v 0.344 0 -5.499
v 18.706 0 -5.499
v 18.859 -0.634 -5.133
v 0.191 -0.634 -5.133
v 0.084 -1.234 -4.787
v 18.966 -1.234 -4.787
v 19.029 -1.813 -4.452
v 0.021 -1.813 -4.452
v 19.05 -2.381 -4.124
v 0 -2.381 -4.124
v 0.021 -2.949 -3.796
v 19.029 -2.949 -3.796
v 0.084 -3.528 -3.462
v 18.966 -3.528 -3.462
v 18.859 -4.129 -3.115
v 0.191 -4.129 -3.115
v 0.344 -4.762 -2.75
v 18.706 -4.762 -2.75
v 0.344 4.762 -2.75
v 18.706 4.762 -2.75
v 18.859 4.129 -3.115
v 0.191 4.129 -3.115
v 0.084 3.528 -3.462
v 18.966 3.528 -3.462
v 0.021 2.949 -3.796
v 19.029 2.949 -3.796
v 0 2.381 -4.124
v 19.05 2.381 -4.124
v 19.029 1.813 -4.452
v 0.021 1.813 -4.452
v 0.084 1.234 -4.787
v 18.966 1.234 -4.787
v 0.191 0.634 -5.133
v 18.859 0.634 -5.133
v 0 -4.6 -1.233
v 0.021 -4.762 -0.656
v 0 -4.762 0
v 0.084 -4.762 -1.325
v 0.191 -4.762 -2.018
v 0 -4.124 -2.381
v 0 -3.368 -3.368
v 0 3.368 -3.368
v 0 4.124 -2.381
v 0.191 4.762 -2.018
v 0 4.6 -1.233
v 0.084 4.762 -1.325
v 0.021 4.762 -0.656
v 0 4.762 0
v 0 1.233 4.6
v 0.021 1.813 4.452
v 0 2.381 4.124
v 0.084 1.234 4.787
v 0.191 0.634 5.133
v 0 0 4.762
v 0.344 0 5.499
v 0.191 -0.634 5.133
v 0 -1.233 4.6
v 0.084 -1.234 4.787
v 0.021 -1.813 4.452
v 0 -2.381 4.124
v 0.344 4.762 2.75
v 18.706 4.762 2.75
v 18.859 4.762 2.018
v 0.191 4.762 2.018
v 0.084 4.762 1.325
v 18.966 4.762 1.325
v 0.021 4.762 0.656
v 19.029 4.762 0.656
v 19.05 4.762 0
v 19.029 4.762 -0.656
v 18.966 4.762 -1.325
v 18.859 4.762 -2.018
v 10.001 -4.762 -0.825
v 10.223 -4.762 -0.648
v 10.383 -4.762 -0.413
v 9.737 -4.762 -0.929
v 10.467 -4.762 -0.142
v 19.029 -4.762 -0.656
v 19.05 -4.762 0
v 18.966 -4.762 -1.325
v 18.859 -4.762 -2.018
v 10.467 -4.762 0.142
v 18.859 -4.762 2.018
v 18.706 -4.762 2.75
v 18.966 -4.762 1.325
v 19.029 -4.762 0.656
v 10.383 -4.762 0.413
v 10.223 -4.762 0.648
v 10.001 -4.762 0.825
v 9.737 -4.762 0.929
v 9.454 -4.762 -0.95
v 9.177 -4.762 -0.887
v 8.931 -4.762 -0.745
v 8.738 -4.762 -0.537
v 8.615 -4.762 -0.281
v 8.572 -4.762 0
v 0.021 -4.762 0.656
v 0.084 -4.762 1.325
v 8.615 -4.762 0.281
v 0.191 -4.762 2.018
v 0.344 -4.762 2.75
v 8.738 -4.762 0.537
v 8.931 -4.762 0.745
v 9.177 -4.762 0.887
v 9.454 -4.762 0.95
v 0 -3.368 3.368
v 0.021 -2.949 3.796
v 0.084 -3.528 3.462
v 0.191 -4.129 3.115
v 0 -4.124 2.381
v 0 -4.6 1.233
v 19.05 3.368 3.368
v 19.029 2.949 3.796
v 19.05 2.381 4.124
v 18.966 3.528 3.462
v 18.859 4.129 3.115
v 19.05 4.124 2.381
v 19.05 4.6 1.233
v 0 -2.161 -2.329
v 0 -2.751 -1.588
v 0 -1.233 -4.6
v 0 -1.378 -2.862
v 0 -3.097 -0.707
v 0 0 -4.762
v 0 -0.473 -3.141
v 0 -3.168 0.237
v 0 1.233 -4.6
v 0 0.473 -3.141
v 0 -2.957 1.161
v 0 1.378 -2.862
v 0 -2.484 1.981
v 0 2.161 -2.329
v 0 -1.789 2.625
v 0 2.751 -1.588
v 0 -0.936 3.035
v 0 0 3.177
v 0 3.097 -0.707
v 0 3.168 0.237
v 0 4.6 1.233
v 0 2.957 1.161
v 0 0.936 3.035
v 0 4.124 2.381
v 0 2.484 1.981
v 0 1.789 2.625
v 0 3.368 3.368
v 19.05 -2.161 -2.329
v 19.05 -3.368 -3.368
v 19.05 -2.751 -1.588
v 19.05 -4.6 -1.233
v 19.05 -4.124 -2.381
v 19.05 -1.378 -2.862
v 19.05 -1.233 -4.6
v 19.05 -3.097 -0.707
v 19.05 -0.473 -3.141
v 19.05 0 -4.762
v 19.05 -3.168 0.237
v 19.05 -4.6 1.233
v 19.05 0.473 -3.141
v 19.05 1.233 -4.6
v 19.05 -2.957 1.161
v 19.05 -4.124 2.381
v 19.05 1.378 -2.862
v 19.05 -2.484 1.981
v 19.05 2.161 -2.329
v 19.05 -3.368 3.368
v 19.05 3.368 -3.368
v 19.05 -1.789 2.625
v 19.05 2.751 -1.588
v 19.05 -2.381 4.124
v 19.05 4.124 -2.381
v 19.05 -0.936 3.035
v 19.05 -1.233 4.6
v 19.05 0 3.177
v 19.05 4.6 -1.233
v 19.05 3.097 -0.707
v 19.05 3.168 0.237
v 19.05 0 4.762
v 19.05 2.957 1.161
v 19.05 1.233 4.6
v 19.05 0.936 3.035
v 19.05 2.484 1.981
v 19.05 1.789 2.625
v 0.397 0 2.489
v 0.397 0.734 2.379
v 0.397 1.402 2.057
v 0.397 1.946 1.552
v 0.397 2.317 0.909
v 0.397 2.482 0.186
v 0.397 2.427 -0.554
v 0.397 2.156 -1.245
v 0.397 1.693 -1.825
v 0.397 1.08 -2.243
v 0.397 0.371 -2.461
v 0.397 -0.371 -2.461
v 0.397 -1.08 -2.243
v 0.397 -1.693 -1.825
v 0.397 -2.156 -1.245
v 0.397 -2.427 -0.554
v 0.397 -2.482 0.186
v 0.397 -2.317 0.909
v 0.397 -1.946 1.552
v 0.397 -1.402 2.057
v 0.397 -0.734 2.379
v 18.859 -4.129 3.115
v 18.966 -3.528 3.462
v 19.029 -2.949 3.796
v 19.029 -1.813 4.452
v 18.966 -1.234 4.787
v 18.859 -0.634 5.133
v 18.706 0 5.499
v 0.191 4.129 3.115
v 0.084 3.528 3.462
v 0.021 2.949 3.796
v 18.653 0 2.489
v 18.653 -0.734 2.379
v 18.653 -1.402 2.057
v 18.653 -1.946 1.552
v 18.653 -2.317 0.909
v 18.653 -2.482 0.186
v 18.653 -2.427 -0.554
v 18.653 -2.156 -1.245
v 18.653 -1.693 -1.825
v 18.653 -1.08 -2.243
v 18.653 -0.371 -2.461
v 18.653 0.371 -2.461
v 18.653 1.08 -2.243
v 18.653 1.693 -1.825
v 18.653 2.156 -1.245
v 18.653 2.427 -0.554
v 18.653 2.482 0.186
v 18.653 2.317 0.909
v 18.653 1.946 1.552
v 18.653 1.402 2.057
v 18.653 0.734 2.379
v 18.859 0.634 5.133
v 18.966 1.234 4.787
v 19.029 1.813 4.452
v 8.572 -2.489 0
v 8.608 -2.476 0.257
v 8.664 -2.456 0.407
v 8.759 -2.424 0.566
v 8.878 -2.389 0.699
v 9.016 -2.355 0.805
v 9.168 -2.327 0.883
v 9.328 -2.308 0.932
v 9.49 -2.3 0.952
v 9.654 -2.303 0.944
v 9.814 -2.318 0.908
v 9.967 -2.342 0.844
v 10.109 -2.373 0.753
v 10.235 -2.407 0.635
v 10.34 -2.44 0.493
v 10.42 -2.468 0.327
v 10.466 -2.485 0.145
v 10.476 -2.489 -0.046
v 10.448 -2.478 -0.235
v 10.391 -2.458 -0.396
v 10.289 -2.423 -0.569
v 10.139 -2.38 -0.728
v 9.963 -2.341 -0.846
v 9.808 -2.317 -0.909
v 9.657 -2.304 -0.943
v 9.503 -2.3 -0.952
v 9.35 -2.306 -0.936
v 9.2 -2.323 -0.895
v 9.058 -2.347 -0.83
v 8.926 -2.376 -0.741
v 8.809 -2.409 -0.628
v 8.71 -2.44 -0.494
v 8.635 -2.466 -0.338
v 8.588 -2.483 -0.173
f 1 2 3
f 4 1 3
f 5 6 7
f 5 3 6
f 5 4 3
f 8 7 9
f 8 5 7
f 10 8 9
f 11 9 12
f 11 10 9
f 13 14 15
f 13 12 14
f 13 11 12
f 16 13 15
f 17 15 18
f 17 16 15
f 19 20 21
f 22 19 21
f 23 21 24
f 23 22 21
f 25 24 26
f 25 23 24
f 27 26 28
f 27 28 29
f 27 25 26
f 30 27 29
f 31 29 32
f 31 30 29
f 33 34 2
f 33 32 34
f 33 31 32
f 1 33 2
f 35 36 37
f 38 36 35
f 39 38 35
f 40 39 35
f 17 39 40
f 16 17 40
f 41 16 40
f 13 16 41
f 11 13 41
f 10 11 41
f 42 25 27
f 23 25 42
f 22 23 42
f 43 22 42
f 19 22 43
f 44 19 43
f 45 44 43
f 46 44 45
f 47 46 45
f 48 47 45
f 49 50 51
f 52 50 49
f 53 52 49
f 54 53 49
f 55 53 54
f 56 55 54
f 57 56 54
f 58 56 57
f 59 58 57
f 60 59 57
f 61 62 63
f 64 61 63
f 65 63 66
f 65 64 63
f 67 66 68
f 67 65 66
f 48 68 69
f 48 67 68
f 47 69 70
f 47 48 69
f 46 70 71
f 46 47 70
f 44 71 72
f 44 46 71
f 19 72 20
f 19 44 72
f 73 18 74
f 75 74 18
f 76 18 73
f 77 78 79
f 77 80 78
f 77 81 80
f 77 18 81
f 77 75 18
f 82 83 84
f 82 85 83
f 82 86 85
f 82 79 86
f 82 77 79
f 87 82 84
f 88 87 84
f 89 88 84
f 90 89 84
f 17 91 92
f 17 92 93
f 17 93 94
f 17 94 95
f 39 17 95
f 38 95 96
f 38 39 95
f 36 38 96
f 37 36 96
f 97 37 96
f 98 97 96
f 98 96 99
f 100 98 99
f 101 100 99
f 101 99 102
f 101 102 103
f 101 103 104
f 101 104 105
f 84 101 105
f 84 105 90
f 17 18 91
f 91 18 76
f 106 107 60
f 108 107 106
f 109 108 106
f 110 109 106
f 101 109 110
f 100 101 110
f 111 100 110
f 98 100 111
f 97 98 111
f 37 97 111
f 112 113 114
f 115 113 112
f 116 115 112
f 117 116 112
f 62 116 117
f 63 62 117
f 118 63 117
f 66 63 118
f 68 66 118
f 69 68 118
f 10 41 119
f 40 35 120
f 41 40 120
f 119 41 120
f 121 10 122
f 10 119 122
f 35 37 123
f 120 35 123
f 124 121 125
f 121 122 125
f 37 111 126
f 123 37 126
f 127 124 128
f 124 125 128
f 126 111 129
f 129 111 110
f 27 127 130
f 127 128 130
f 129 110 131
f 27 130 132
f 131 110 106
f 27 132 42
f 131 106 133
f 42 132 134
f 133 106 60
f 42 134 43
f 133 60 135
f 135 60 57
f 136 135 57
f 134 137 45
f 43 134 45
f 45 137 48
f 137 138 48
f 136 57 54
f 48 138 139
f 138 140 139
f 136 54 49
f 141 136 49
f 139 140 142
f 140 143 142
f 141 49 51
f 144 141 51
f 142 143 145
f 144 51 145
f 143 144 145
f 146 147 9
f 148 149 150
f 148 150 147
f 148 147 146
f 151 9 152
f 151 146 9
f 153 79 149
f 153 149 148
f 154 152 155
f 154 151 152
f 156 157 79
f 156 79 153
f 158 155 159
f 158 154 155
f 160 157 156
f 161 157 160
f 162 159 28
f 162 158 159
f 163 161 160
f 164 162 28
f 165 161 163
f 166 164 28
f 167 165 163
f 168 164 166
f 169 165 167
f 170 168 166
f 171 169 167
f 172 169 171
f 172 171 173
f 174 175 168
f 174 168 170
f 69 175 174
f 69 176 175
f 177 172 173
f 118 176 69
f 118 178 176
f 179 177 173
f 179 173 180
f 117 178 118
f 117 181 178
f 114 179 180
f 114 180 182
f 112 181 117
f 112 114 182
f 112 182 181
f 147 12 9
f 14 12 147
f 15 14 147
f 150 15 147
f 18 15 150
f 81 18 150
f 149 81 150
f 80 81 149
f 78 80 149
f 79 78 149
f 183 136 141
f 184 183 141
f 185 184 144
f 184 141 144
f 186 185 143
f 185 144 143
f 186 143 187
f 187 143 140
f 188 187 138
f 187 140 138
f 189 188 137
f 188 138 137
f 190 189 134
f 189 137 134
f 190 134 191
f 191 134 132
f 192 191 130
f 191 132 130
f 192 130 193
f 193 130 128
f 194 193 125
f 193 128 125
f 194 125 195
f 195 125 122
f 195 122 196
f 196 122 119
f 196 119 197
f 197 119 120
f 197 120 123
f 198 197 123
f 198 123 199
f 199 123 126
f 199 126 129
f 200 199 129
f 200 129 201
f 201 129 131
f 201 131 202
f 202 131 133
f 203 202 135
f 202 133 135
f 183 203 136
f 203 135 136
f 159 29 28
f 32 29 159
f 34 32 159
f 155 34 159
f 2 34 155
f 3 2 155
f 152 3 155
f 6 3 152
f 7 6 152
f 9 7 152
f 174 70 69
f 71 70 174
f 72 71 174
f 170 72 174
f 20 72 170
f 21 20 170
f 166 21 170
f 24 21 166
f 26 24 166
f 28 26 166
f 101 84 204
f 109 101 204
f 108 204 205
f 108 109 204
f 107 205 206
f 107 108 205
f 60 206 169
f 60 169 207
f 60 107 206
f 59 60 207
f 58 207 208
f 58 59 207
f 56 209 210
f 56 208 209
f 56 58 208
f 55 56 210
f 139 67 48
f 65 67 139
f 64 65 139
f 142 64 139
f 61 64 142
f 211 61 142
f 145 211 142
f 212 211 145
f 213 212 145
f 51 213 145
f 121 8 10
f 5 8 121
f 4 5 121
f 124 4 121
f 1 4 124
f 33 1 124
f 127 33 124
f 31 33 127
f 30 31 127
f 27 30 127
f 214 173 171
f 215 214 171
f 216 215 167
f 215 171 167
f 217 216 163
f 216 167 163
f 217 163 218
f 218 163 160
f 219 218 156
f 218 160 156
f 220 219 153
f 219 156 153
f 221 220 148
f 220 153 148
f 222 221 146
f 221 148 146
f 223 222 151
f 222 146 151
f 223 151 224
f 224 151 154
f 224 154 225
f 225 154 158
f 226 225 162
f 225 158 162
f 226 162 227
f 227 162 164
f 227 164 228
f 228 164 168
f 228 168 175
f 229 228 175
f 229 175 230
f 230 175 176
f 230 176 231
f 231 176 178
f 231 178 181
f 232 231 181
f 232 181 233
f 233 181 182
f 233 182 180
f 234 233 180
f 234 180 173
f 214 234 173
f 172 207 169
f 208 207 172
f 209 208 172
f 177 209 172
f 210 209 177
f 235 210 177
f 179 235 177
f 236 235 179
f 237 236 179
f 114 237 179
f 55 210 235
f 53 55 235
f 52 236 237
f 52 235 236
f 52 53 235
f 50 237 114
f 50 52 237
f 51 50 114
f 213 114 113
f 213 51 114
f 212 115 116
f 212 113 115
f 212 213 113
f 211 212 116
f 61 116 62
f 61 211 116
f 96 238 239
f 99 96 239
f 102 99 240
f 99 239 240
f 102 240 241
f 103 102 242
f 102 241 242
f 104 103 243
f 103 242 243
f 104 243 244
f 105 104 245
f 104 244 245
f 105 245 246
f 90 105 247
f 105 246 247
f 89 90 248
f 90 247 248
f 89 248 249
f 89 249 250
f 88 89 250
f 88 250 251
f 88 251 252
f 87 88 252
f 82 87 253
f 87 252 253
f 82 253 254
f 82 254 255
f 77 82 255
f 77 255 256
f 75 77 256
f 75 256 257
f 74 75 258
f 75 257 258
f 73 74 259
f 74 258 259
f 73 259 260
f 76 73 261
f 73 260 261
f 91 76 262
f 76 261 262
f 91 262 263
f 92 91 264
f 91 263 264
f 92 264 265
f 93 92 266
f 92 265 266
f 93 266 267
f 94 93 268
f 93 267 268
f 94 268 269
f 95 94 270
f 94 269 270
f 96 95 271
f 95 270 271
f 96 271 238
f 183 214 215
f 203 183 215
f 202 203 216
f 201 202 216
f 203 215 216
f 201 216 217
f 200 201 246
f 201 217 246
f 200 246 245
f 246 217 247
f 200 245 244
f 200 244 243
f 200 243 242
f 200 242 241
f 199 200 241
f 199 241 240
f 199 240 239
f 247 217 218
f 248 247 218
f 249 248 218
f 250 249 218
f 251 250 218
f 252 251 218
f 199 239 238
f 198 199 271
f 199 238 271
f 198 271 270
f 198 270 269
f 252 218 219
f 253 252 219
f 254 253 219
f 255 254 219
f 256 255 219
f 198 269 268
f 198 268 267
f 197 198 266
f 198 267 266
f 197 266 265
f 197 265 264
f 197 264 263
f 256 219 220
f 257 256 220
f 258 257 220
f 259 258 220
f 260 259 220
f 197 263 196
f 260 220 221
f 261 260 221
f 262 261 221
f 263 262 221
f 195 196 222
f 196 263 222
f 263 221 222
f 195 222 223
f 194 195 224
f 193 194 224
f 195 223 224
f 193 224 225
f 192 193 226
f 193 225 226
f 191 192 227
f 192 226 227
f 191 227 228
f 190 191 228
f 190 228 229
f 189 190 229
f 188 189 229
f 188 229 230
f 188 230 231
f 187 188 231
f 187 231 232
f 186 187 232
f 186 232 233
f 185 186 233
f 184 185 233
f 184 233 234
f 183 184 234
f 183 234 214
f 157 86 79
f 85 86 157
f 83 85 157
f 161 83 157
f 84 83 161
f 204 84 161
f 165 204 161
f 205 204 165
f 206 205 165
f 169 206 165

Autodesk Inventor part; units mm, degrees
ref_plane "YZ Plane" through (0, 0, 0) normal (1, 0, 0) x (0, 1, 0)
ref_plane "XZ Plane" through (0, 0, 0) normal (0, 1, 0) x (-1, 0, 0)
sketch "Sketch1" plane through (0, 0, 0) normal (1, 0, 0) x (0, 1, 0)
  line L0 (-6.6675, 0) -> (6.6675, 0) projected
  line L1 (0, -7.699) -> (0, 7.699) projected
  line L2 (0, 5.4993) -> (4.7625, 2.7496)
  line L3 (4.7625, 2.7496) -> (4.7625, -2.7496)
  line L4 (4.7625, -2.7496) -> (0, -5.4993)
  line L5 (0, -5.4993) -> (-4.7625, -2.7496)
  line L6 (-4.7625, -2.7496) -> (-4.7625, 2.7496)
  line L7 (-4.7625, 2.7496) -> (0, 5.4993)
  point P0 (0, 0)
  dimension "d40" = 9.525
extrude "Body" add sketch "Sketch1" along normal blind 19.05
sketch "Sketch2" plane through (0, 0, 0) normal (-1, 0, 0) x (0, 0, 1)
  line L0 (0, -6.6675) -> (0, 6.6675) projected
  line L1 (-7.699, 0) -> (7.699, 0) projected
  point P0 (0, 0)
hole "Thread" at (0, 0, 0) direction (1, 0, 0) diameter 4.9784 end through all thread size "1/4-20 UNC" class "2B" standard "ANSI Unified Screw Threads"
sketch "Sketch3" plane through (0, 0, 0) normal (0, 0, 1) x (1, 0, 0)
  line L0 (-3.81, 0) -> (22.86, 0) projected
  line L1 (0, 0) -> (0, 4.7625) projected
  line L2 (19.05, 0) -> (19.05, 4.7625) projected
  line L3 (0, 4.7625) -> (19.05, 4.7625) construction
  line L4 (0, 5.4993) -> (0, 4.7625)
  line L5 (0, 4.7625) -> (0.3436, 5.4993)
  line L6 (0.3436, 5.4993) -> (0, 5.4993)
  line L7 (19.05, 4.7625) -> (19.05, 5.4993)
  line L8 (19.05, 5.4993) -> (18.7064, 5.4993)
  line L9 (18.7064, 5.4993) -> (19.05, 4.7625)
  line L10 (0.3436, 5.4993) -> (18.7064, 5.4993)
  line L11 (0, 4.7625) -> (19.05, 4.7625)
  line L12 (0, 0) -> (19.05, 0) projected
  dimension "d45" = 9.525
  dimension "d46" = 10.9985
  dimension "d47" = 25
  dimension "d48" = 25
revolve "Chamfer1" cut sketch "Sketch3" angle 360 about axis through (-10, 0, 0) along (1, 0, 0) contours L4 L6 L5 | L9 L8 L7
chamfer "Chamfer2" distance 0.6874 angle 30 1 edges at (0, 0, -2.4892) measured on face at (0, 2.8968, -2.7339)
chamfer "Chamfer3" distance 0.6874 angle 30 1 edges at (19.05, 0, -2.4892) measured on face at (19.05, 2.8968, -2.7339)
sketch "Sketch4" plane through (0, 0, 0) normal (0, 1, 0) x (-1, 0, 0)
  line L0 (0, -1.3335) -> (0, 1.3335) projected
  line L1 (-8.1915, 0) -> (-10.8585, 0) projected
  circle A0 centre (-9.525, 0) radius 0.9525
  dimension "d36" = 1.905
  dimension "d37" = 9.525
extrude "Hole" cut sketch "Sketch4" against normal through all
ref_plane "Work Plane1" through (23.9707, 0, 0) normal (0, 1, 0) x (-1, 0, 0)
equation "\"d40\" = SW"
equation "\"d1\" = KOH"
equation "\"d8\" = -0.5 * GD1 + 0.5 * NND"
equation "\"d49\" = -0.5 * GD1 + 0.5 * NND"
equation "\"d10\" = -0.5 * GD1 + 0.5 * NND"
equation "\"d50\" = -0.5 * GD1 + 0.5 * NND"
equation "\"d36\" = BOR"
equation "\"d37\" = 0.5 * KOH"
equation "\"d45\" = SW0"
equation "\"d46\" = 1.1547 * SW"
equation "\"d47\" = ANG1"
equation "\"d48\" = ANG2"
equation "\"ANG1\" = 25deg"
equation "\"ANG2\" = 25deg"
equation "\"NND\" = 6.35"
equation "\"KOH\" = 19.05"
equation "\"SW\" = 9.525"
equation "\"SW0\" = SW"
equation "\"SW01\" = SW"
equation "\"BOR\" = 1.905"
equation "\"THREADDIA\" = 6.35"
equation "\"TOA\" = 30deg"
equation "\"DIST\" = 0.5 * KOH"
equation "\"E0\" = 1.155 * SW"
equation "\"GD1\" = 4.975185"
properties part number "IFI 128 - 1/4 - 20" material "Steel, Mild"
